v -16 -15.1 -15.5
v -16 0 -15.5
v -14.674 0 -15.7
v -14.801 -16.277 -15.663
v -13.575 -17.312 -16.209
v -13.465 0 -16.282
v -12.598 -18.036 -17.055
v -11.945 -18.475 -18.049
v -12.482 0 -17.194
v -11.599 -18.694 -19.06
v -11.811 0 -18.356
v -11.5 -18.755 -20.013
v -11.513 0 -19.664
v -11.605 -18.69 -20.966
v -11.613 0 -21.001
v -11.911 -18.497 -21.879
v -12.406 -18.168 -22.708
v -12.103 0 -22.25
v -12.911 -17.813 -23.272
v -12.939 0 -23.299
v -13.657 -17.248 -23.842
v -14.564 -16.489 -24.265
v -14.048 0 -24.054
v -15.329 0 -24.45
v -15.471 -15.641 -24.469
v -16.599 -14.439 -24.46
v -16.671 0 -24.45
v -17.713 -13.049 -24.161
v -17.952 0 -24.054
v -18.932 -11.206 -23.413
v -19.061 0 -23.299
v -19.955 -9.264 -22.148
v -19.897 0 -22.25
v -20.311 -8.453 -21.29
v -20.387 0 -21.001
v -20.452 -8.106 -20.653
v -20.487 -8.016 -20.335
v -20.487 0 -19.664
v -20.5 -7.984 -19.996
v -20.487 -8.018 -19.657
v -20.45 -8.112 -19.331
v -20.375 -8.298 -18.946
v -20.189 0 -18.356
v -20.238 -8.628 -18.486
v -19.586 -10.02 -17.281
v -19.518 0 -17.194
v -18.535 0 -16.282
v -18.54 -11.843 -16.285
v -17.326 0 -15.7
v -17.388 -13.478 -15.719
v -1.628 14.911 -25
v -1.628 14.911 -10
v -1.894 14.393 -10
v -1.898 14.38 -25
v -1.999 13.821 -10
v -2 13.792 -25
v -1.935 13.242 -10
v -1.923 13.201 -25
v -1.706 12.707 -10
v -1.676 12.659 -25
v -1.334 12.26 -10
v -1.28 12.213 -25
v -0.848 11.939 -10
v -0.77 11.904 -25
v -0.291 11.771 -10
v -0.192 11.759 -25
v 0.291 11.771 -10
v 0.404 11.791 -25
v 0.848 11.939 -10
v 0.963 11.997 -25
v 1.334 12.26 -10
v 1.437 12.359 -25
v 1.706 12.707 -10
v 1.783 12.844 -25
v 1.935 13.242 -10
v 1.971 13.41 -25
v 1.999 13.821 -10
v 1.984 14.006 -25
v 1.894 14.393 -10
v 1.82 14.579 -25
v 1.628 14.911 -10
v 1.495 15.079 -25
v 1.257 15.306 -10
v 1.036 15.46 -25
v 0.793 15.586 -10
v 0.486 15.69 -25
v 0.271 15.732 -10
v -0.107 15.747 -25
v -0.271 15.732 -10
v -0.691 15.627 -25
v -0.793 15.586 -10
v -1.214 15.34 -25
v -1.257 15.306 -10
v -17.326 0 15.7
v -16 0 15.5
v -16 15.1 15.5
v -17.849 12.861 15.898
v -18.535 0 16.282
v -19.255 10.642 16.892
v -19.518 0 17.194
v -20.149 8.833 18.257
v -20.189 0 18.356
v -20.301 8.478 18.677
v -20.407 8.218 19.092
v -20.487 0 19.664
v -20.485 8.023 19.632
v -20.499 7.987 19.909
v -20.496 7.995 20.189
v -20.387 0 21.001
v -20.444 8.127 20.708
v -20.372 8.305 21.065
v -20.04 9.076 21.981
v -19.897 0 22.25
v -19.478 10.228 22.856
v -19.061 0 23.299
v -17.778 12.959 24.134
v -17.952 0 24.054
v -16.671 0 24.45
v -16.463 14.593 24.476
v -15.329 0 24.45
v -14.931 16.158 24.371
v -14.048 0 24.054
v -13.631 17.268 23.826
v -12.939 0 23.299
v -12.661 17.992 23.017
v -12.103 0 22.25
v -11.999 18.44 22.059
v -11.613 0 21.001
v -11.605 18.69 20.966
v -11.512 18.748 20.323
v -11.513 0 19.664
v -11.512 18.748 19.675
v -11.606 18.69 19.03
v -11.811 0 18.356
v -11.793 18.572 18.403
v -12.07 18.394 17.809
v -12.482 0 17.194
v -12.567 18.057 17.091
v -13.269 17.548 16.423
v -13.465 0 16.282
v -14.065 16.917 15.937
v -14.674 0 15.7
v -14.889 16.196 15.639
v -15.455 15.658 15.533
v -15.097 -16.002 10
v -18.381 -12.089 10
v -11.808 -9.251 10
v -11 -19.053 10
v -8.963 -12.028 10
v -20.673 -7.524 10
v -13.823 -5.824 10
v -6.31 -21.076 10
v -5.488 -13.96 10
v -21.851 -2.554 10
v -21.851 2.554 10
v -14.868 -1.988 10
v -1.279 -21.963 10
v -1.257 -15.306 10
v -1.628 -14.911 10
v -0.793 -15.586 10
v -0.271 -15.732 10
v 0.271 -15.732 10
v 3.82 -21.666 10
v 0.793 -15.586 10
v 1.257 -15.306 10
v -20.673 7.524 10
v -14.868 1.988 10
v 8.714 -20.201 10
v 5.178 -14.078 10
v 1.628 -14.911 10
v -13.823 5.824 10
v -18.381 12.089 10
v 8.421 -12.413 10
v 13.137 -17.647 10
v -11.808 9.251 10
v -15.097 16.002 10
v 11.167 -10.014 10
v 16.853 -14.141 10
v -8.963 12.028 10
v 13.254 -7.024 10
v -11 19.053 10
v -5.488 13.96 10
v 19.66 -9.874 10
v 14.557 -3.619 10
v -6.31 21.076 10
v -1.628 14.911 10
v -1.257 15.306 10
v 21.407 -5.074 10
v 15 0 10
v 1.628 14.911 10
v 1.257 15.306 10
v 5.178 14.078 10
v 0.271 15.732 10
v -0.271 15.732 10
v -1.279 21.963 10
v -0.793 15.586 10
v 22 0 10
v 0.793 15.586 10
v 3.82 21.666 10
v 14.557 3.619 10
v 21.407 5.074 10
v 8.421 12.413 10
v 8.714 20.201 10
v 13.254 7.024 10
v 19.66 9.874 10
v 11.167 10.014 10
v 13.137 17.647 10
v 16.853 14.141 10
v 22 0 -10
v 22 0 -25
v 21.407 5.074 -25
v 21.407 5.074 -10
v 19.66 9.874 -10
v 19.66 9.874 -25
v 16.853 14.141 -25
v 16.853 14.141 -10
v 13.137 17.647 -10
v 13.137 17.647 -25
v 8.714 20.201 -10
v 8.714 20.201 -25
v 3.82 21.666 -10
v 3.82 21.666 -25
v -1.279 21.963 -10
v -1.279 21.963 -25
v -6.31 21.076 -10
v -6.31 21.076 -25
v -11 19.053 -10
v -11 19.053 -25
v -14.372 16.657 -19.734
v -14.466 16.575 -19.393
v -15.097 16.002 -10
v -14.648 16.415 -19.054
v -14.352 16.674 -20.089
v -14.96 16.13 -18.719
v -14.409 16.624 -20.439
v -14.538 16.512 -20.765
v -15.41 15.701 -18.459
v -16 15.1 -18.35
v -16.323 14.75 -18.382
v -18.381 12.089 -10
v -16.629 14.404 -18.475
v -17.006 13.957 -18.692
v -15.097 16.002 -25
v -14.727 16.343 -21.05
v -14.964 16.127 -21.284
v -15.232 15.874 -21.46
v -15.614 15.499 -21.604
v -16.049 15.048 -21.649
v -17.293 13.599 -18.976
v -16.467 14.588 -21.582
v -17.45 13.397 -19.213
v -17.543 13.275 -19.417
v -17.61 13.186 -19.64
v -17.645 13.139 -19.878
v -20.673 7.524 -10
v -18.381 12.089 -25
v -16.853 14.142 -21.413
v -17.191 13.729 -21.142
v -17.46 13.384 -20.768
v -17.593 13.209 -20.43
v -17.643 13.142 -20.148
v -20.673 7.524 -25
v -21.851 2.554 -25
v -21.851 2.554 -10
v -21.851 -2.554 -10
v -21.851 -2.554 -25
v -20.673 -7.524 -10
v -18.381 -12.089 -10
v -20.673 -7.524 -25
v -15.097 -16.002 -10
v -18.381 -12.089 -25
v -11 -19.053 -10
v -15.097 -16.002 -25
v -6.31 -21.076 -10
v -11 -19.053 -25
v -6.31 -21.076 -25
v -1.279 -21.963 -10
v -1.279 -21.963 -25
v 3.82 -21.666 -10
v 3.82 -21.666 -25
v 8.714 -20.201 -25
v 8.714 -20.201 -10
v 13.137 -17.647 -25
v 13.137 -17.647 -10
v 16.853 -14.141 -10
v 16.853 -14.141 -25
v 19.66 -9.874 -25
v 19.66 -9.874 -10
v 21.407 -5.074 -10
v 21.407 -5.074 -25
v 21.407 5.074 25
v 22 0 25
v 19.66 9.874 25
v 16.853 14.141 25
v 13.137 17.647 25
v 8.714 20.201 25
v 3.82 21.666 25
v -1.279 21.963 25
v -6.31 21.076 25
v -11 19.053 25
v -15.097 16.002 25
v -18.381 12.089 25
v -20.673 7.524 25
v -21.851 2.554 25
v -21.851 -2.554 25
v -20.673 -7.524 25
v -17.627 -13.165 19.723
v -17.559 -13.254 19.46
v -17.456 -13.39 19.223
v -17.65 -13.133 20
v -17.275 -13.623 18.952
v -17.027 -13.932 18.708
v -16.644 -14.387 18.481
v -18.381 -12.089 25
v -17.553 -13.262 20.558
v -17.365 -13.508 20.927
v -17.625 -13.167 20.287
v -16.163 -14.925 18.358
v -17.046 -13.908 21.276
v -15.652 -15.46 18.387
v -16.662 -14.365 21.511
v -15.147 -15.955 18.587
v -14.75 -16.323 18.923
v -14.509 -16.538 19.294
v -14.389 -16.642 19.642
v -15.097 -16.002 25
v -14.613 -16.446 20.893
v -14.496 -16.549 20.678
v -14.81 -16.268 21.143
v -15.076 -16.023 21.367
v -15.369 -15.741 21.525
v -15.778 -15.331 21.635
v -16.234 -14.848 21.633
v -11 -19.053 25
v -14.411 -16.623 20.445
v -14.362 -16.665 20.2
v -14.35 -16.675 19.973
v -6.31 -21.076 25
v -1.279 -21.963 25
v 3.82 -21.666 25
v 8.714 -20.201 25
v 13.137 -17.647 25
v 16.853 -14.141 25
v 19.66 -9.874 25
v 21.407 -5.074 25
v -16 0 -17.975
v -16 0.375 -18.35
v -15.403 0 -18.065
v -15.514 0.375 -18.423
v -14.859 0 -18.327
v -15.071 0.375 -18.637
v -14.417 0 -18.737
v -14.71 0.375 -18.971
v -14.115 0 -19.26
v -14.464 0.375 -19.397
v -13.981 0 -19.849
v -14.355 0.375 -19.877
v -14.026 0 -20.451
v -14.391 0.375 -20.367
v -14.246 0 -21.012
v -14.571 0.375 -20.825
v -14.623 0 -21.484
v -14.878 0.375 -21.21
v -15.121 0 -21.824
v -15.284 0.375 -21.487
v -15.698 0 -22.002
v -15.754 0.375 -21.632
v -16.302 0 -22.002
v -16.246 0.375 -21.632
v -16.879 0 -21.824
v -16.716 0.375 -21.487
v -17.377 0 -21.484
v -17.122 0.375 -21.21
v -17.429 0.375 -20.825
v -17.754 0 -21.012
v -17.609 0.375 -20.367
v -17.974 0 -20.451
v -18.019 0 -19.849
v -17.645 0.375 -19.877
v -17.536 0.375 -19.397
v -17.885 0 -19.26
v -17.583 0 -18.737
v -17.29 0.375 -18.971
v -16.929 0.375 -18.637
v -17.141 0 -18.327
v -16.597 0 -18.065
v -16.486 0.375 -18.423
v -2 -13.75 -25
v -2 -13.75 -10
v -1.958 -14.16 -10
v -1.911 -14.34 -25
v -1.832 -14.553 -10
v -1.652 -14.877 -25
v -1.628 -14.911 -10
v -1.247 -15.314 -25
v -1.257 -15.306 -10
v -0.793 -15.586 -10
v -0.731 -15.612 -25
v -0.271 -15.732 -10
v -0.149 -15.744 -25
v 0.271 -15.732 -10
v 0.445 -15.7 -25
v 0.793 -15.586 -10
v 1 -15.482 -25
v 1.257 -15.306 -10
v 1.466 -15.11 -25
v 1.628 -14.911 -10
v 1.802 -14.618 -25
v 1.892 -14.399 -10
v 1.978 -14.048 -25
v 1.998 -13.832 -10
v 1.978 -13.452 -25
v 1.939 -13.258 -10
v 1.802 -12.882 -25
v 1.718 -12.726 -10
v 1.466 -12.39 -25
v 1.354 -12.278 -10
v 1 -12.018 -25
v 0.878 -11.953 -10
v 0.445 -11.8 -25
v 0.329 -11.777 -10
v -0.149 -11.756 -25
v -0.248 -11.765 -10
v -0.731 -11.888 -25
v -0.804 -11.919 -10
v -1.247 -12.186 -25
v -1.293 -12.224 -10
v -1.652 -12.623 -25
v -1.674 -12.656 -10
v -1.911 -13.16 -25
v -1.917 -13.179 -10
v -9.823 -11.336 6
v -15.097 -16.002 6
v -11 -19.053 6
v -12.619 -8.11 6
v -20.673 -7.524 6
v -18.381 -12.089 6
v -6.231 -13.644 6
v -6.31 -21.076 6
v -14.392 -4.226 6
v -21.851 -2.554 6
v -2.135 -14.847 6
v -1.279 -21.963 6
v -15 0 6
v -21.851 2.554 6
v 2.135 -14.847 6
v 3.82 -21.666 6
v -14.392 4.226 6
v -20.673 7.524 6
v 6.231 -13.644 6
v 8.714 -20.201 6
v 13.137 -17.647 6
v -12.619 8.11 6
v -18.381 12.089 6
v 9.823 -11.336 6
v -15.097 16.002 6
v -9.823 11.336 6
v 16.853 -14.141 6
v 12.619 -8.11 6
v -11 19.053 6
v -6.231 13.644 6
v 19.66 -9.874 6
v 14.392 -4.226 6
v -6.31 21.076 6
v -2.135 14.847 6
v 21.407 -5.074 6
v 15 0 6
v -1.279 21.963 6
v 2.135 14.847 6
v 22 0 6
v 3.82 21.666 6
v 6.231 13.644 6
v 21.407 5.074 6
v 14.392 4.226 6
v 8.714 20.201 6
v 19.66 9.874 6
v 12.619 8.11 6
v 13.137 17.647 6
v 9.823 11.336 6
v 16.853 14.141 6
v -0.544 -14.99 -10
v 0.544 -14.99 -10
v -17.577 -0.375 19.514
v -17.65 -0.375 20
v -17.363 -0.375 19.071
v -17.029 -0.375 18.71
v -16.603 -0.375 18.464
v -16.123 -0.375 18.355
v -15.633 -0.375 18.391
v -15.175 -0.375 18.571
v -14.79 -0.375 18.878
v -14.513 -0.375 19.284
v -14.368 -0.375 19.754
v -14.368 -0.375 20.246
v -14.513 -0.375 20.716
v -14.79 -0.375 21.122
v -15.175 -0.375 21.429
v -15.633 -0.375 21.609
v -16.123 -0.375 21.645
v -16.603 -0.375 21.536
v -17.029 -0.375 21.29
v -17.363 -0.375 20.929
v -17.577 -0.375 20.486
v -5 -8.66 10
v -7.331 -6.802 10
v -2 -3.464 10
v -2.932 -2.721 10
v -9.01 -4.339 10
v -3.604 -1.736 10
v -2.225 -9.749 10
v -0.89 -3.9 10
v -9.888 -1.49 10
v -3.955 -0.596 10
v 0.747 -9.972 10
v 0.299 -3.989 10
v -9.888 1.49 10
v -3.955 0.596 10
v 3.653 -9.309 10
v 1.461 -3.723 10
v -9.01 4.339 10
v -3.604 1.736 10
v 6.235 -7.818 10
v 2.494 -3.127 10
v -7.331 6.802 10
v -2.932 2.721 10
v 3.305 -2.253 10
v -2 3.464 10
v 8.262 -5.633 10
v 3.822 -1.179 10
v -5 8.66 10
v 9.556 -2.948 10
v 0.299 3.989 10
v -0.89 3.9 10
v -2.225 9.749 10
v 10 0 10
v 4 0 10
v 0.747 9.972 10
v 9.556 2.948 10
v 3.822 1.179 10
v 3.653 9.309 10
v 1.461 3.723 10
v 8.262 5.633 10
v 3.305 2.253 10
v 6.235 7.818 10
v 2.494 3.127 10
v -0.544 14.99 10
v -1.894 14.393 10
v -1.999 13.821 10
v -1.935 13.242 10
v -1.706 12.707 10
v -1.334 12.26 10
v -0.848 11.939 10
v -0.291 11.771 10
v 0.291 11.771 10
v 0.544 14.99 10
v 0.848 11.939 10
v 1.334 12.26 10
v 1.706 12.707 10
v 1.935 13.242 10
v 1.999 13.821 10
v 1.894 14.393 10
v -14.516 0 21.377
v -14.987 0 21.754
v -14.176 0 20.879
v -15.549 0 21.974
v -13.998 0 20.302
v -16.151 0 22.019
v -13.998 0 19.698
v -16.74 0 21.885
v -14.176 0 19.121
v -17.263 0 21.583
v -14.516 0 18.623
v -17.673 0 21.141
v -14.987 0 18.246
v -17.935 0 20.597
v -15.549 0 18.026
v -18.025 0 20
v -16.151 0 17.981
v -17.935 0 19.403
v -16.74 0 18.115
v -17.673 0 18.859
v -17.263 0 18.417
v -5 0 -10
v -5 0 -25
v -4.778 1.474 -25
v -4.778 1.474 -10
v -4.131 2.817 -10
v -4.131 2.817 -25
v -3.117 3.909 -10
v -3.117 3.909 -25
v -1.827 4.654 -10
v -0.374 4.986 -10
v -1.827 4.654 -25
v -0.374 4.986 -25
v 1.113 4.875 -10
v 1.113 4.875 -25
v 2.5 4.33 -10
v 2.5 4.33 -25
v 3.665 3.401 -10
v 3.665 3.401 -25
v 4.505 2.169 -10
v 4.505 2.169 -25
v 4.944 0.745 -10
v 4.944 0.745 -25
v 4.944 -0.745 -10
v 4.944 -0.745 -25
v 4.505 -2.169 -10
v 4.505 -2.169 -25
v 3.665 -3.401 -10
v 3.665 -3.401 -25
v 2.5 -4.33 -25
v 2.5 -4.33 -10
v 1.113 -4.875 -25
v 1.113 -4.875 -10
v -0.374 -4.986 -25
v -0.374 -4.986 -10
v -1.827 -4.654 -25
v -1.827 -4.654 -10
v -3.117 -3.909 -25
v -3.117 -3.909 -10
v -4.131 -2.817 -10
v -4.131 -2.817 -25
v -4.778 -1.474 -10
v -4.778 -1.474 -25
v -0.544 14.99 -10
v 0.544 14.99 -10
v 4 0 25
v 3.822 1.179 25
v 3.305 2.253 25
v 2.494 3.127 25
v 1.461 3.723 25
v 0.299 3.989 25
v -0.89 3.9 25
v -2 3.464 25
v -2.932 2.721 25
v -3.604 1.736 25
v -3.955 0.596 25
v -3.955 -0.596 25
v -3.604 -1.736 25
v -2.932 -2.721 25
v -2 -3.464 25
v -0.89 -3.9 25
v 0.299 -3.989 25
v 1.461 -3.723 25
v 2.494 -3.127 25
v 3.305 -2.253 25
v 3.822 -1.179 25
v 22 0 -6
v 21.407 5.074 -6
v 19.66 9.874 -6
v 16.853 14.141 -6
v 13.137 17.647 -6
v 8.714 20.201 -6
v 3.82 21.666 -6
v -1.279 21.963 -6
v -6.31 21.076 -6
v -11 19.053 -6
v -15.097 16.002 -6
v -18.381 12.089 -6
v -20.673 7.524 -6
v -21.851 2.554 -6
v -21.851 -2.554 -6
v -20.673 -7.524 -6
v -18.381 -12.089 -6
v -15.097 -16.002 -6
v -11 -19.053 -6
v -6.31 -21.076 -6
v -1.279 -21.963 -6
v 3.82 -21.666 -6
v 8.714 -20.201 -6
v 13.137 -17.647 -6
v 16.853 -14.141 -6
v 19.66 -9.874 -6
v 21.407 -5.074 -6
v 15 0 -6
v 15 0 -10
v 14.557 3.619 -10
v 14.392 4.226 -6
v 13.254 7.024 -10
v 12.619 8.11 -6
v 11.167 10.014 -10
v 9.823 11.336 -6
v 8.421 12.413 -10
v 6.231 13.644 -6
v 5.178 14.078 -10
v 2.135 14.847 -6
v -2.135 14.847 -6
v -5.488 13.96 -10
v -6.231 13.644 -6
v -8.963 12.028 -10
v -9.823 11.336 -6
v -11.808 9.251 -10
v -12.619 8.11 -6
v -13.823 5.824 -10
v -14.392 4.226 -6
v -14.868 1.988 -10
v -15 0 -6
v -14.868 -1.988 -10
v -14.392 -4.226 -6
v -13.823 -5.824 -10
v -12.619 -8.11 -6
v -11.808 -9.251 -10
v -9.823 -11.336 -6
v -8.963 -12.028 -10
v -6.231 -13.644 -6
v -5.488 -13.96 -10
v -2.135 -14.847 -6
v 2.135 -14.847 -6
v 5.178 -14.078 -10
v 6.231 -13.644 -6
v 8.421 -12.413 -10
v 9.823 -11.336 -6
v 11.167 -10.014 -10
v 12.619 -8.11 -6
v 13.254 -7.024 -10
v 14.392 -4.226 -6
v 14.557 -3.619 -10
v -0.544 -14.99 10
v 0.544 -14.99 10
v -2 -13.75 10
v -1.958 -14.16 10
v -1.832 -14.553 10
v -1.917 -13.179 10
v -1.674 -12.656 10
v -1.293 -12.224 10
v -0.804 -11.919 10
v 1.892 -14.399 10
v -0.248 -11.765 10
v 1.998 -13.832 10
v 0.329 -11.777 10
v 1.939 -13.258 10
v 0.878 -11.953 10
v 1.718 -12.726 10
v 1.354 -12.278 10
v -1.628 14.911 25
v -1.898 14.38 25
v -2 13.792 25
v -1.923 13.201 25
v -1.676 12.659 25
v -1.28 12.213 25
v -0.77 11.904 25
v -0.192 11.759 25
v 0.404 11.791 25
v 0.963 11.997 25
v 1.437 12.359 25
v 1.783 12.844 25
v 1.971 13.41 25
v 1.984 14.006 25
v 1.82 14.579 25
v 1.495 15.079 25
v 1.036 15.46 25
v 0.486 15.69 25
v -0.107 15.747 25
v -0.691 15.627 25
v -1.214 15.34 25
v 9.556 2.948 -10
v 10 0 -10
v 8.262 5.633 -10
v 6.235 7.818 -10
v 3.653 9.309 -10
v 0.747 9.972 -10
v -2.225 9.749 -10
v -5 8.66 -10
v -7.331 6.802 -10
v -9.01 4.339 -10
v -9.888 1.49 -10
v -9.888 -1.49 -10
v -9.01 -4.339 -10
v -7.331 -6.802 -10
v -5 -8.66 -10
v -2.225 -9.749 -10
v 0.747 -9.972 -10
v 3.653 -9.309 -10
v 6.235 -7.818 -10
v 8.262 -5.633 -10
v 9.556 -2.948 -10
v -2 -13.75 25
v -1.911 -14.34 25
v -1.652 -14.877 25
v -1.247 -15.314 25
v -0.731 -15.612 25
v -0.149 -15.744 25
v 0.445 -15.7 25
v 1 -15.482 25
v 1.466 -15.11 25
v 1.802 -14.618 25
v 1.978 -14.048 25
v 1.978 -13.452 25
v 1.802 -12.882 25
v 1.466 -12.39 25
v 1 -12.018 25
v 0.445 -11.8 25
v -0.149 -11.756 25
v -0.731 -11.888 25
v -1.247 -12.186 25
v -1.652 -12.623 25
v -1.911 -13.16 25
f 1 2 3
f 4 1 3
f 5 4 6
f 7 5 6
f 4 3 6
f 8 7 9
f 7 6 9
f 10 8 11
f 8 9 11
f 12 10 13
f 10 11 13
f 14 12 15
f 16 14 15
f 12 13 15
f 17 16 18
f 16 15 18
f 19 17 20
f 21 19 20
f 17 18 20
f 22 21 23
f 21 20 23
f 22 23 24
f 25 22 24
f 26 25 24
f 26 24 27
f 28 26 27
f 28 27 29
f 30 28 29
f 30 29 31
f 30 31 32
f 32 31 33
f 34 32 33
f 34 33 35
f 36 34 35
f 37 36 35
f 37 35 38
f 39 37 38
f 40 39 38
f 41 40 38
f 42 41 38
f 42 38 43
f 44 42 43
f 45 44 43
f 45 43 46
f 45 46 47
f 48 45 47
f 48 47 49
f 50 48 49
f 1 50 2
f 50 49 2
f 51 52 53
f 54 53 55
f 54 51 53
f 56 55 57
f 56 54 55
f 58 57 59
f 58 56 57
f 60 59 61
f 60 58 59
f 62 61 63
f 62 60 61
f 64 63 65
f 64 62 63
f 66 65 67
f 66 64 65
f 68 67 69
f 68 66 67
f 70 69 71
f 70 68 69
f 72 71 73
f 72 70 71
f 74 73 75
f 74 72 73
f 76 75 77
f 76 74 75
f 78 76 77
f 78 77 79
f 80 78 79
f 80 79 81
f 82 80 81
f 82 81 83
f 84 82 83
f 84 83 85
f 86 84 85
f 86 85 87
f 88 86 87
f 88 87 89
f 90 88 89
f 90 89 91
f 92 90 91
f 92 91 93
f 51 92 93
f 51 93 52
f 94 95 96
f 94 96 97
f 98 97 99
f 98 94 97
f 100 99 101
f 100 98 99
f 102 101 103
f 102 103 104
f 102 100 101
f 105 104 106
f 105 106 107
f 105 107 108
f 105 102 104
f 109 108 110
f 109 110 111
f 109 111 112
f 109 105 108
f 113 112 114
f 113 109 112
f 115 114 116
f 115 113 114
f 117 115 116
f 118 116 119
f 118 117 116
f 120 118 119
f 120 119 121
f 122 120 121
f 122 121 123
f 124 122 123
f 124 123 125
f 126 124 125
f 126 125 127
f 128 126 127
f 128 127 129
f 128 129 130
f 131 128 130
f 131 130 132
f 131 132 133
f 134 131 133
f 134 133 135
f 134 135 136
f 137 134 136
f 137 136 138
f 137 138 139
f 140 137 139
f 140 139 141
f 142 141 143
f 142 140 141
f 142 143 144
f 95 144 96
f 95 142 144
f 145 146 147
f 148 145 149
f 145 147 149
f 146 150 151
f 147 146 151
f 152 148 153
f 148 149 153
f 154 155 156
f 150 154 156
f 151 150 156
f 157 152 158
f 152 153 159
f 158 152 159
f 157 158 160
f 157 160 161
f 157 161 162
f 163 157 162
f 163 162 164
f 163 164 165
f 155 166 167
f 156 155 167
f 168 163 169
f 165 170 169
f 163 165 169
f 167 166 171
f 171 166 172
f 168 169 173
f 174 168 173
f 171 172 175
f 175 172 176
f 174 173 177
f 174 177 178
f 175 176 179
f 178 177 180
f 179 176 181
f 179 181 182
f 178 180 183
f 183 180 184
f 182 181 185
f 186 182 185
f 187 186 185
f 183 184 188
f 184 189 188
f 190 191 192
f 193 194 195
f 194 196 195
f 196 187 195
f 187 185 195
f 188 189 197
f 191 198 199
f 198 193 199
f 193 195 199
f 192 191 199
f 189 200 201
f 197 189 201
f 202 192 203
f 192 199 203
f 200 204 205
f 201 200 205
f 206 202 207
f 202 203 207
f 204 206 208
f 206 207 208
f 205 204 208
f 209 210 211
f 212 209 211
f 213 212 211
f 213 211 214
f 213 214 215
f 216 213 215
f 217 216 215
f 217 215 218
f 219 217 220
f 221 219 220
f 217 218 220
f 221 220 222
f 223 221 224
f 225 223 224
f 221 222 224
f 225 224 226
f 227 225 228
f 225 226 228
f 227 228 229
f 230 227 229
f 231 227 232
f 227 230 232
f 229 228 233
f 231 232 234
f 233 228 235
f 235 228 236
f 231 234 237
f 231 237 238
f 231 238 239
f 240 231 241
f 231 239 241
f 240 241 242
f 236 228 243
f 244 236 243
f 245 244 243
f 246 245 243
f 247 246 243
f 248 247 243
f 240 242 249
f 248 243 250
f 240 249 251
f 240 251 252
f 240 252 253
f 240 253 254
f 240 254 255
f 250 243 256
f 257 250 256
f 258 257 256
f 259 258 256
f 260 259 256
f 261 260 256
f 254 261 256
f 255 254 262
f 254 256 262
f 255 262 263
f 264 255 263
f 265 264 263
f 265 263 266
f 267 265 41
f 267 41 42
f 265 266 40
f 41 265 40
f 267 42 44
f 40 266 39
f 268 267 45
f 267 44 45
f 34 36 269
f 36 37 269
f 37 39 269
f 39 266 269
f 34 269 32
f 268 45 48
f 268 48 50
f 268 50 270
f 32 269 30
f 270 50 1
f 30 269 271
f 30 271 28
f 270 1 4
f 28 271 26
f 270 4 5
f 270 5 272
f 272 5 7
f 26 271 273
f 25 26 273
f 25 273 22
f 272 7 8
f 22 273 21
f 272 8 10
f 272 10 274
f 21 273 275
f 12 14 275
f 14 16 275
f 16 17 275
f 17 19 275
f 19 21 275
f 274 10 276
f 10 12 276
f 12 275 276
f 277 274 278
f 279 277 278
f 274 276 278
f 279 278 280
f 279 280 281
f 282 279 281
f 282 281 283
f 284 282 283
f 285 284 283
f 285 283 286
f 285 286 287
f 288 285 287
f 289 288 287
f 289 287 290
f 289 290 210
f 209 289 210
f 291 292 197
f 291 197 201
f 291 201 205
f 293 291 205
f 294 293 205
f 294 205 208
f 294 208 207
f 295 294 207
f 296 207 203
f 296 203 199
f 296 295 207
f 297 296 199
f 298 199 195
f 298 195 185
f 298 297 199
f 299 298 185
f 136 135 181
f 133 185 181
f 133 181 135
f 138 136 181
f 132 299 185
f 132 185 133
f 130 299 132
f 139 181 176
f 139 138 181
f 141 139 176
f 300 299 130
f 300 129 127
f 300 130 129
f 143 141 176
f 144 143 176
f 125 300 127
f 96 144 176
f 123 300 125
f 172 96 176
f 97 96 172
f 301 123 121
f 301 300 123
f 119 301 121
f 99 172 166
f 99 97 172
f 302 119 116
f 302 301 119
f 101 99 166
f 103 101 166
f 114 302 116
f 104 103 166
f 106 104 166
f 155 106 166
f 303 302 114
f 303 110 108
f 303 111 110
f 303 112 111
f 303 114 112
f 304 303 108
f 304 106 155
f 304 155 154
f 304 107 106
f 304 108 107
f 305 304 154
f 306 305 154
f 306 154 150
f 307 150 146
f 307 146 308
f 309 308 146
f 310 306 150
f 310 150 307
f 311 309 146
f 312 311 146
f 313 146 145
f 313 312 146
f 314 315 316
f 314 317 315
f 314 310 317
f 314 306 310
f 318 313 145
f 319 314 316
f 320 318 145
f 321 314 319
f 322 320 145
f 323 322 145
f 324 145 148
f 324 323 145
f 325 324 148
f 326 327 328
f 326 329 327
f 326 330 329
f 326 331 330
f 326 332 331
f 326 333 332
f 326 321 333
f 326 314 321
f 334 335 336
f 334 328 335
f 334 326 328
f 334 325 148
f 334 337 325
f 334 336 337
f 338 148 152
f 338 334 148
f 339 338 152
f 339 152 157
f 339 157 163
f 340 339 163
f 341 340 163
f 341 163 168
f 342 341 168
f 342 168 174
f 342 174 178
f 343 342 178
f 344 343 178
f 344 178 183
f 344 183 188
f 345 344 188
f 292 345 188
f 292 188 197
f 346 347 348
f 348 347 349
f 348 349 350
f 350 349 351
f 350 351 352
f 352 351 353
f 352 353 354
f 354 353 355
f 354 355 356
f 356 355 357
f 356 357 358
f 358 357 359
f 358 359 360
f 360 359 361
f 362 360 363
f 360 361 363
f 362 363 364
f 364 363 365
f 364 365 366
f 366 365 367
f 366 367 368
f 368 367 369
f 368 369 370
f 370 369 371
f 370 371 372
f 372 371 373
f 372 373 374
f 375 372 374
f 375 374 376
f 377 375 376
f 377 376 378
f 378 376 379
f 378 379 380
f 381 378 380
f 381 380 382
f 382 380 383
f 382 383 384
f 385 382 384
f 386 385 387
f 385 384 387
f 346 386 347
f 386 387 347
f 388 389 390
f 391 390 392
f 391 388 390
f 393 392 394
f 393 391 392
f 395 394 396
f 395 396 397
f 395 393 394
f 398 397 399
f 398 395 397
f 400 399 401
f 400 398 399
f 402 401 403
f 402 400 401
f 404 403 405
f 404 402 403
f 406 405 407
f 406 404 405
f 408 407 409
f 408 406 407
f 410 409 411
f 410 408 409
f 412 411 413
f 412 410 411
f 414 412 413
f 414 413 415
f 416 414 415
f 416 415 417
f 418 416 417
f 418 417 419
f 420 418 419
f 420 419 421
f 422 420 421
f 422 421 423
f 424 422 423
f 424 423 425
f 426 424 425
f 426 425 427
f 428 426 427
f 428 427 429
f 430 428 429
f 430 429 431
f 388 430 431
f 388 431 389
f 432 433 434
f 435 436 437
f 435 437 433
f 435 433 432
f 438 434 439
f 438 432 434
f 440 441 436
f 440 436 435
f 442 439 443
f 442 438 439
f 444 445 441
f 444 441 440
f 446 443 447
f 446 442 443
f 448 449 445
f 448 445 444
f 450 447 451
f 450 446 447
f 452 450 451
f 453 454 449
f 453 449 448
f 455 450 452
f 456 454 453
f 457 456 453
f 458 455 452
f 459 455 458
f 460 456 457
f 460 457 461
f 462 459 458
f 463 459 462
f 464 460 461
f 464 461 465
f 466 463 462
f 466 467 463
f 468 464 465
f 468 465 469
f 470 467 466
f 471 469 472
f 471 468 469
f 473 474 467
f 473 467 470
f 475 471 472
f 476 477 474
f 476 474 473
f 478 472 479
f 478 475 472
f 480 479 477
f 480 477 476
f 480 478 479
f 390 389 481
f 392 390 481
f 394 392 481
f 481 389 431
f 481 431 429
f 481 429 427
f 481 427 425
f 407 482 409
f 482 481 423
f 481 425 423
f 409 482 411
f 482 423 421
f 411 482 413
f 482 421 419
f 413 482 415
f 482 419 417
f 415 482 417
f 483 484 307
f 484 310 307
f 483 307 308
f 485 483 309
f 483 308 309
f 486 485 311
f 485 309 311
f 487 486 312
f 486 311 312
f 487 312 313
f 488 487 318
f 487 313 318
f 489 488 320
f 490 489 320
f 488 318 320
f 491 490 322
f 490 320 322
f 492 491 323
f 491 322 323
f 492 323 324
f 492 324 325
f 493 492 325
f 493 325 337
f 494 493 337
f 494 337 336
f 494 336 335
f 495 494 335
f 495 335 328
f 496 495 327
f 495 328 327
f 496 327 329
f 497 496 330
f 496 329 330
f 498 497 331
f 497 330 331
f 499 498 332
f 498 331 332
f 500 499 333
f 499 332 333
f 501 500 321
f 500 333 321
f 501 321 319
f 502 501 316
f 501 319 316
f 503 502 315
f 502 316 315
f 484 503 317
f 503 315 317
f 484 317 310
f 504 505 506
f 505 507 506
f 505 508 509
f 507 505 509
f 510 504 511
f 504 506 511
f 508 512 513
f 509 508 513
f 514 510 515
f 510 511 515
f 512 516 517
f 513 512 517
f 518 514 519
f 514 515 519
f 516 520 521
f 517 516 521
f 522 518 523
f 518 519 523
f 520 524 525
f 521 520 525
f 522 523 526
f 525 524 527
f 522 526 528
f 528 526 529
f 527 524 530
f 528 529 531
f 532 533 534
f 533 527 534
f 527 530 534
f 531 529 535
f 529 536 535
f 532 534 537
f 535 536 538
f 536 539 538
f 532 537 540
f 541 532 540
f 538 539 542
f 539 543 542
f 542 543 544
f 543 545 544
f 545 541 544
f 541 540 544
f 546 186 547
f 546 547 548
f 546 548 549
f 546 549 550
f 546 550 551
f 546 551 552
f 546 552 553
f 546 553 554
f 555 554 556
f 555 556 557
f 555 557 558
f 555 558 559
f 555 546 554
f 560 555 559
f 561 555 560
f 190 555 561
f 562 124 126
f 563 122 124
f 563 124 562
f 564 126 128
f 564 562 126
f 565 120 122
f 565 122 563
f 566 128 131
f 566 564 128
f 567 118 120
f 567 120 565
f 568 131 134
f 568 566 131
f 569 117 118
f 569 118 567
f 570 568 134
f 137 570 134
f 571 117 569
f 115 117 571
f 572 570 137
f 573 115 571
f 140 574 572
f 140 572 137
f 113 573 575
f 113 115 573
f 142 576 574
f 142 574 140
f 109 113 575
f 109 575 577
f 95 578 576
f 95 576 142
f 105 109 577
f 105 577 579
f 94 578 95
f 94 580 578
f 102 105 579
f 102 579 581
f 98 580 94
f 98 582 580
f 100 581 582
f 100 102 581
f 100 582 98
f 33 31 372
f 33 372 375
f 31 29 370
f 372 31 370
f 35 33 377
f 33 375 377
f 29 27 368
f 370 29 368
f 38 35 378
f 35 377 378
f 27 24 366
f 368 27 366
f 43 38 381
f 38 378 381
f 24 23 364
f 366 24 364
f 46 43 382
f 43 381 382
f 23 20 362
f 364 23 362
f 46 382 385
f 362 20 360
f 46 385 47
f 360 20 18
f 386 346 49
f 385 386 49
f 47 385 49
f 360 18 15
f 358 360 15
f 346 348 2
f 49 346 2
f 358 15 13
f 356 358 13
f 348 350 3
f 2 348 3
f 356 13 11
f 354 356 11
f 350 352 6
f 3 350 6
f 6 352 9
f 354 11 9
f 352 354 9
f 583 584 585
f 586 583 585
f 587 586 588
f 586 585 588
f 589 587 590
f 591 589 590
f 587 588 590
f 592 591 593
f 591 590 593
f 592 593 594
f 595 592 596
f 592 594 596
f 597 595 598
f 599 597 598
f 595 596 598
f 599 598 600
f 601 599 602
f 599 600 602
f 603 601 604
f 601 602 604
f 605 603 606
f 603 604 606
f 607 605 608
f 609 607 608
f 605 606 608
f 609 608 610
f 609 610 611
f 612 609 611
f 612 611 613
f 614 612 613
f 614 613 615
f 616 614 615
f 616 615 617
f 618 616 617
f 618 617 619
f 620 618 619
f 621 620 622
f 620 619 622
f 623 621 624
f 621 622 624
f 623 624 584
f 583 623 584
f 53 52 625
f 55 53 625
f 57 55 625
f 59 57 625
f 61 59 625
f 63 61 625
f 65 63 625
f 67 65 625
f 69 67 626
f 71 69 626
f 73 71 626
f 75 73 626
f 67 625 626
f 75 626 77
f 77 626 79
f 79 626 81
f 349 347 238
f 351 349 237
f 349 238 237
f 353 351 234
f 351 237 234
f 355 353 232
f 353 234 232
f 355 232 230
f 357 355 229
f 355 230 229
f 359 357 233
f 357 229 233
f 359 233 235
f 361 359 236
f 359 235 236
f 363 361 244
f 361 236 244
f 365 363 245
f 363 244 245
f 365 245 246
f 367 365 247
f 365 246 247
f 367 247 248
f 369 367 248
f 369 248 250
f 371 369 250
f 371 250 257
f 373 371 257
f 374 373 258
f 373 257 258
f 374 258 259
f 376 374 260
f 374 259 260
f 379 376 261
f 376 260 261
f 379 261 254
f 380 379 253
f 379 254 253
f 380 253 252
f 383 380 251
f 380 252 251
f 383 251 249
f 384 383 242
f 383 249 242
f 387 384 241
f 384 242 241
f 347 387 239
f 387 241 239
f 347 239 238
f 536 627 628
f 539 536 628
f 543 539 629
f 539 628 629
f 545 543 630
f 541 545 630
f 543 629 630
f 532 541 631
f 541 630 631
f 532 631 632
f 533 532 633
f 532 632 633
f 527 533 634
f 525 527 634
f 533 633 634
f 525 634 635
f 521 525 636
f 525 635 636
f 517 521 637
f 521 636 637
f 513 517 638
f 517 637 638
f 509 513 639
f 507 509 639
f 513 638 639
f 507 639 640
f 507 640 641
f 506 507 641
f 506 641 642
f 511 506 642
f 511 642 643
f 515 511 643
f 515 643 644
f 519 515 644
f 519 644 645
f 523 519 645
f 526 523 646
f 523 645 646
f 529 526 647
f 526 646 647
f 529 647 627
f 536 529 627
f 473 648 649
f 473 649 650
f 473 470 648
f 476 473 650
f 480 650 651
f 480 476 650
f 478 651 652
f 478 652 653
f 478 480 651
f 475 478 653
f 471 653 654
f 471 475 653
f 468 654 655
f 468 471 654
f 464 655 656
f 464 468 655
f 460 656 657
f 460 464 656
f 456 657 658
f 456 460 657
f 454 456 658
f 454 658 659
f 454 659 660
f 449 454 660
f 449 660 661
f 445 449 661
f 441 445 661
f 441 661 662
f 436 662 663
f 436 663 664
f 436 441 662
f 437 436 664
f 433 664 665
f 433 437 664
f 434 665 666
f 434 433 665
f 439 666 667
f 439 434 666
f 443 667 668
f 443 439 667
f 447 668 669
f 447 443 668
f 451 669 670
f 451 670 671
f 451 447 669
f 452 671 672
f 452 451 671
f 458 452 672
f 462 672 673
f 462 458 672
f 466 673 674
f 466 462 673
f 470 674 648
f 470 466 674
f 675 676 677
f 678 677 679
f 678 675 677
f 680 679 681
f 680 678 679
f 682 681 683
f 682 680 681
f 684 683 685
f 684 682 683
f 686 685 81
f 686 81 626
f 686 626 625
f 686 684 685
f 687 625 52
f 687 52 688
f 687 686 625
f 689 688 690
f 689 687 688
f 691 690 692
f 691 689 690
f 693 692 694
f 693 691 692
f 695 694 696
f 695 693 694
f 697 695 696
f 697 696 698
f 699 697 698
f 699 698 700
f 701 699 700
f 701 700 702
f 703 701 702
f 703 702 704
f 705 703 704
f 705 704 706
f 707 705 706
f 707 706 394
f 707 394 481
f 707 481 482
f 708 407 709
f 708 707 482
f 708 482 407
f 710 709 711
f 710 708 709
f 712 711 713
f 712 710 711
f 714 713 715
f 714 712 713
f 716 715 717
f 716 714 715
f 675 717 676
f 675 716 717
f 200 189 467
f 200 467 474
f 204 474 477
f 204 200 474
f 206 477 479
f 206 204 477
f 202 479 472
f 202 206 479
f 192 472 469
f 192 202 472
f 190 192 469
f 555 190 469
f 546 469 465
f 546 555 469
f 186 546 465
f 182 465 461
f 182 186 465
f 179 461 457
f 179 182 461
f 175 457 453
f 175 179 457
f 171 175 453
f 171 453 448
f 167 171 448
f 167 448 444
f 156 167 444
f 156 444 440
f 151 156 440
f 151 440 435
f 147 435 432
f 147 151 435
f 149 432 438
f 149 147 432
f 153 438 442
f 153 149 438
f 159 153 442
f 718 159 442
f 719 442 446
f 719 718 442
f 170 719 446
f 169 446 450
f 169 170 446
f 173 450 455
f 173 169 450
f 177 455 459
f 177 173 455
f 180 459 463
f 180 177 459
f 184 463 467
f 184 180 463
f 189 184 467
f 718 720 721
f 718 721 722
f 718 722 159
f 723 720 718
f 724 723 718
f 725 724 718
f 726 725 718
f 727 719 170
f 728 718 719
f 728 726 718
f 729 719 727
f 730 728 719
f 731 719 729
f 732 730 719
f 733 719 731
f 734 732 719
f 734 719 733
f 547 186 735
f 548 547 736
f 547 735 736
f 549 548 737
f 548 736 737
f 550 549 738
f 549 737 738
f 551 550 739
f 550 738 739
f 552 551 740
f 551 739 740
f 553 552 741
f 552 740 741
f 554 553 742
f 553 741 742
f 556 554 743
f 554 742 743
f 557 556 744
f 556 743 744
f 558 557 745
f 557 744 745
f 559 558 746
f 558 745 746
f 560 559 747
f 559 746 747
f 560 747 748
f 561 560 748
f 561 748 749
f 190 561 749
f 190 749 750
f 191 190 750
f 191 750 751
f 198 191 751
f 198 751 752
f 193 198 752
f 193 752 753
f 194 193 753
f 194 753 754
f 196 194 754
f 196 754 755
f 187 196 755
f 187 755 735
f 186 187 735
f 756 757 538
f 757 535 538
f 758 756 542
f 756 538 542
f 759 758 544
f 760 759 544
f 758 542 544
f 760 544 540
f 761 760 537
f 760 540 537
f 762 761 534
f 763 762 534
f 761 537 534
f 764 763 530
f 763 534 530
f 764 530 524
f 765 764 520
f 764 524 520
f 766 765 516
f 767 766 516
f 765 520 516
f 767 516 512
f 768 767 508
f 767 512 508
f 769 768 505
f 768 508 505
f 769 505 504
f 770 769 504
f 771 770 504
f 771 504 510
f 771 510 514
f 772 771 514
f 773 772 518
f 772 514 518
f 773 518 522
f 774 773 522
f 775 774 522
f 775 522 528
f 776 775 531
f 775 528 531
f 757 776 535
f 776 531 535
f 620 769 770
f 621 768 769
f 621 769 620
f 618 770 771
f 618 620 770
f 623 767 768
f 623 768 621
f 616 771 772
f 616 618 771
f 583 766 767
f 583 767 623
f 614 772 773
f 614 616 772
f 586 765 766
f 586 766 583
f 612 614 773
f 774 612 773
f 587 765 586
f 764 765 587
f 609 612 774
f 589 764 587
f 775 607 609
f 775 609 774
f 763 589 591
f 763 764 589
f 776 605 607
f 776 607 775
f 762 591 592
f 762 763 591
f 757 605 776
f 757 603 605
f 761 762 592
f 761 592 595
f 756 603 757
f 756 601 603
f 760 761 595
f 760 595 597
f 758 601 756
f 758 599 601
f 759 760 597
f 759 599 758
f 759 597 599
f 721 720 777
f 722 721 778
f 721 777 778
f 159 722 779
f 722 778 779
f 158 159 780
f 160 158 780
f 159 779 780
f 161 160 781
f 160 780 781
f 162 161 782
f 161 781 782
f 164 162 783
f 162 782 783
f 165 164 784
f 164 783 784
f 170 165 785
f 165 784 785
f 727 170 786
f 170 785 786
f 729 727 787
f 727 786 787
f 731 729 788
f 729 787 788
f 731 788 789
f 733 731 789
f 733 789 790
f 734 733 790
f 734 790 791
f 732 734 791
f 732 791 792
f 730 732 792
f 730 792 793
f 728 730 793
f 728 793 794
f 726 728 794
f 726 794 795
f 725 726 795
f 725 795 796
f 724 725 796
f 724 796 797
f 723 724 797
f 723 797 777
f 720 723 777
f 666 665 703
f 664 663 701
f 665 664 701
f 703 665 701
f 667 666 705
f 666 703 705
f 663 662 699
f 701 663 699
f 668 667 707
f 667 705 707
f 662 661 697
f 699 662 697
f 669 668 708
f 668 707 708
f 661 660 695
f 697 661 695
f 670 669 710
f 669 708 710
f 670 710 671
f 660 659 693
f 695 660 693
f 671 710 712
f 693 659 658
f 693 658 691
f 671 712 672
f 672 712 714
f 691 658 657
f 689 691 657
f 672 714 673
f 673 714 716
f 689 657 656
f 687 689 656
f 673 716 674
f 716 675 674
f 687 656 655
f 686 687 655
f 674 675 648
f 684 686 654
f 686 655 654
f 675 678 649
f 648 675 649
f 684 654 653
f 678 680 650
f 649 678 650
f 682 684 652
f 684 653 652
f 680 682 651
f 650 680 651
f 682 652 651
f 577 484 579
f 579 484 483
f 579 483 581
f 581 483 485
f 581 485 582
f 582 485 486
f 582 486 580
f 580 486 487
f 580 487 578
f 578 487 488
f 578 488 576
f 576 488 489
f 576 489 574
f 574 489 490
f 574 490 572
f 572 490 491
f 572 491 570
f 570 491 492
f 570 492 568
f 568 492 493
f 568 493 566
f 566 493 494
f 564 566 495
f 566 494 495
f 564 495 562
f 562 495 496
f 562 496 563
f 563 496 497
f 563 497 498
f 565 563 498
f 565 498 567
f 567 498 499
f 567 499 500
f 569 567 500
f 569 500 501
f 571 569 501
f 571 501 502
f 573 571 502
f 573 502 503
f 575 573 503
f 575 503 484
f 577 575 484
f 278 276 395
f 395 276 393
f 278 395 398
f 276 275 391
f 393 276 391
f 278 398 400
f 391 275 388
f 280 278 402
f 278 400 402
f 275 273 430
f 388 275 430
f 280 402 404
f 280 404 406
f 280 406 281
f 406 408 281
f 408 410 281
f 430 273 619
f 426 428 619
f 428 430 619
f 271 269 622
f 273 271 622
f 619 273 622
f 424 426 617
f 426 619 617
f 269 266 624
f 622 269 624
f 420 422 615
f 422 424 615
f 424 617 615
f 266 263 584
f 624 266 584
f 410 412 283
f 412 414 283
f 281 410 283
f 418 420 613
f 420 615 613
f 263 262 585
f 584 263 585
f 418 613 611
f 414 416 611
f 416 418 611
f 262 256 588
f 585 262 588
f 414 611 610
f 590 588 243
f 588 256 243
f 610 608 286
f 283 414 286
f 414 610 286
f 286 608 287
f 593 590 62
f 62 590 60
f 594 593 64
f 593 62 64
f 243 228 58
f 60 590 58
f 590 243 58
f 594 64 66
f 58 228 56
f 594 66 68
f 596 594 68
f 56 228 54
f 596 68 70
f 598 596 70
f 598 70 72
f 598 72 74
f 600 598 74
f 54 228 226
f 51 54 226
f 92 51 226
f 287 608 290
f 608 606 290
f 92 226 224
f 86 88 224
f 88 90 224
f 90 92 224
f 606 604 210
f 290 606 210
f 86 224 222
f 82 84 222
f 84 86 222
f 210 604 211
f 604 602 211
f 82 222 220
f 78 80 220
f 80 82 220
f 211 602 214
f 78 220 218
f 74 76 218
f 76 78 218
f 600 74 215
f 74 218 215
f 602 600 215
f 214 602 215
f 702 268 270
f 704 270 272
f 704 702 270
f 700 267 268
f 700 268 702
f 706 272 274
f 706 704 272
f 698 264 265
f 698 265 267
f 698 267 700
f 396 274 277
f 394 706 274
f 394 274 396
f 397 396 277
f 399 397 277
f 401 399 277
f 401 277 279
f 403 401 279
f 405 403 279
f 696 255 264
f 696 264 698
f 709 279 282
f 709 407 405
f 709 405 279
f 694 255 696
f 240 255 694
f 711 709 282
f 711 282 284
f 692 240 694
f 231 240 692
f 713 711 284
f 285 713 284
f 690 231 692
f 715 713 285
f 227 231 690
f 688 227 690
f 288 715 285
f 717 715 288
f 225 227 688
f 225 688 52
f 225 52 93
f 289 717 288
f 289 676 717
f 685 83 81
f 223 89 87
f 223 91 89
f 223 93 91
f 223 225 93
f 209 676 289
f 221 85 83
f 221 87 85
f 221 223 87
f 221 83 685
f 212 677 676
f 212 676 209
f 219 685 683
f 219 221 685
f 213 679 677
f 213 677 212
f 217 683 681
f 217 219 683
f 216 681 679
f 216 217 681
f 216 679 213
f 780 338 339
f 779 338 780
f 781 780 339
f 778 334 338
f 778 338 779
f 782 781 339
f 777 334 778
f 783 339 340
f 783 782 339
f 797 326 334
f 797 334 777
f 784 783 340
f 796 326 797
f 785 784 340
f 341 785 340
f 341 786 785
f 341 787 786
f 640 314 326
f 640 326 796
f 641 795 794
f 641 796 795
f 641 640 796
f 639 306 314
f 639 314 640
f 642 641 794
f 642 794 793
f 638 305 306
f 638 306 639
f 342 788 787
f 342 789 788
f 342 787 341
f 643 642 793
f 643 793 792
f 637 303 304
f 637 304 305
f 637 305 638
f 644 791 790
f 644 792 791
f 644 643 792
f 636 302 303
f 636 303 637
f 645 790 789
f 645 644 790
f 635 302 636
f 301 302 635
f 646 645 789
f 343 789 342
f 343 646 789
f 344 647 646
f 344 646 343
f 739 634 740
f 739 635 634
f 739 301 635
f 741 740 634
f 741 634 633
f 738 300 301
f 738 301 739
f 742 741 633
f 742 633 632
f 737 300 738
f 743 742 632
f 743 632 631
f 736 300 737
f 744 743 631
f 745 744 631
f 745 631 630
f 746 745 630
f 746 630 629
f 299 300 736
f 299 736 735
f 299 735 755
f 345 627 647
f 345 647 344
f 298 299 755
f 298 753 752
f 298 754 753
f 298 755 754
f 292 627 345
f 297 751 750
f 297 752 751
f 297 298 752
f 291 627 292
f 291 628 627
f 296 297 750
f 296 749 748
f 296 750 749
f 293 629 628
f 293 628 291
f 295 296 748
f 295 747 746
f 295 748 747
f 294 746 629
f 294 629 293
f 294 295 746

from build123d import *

# Parameters (mm, degrees)
SKETCH_1_R                   = 22
EXTRUDE_1_DEPTH              = 6
SKETCH_2_R                   = 15
EXTRUDE_2_DEPTH              = 10
EXTRUDE_START                = 15
SKETCH_3_R                   = 22
SKETCH_3_R_2                 = 2
EXTRUDE_3_DEPTH              = 15
SKETCH_4_R                   = 1.5
CUT_EXTRUDE_1_DEPTH          = 40.912404087
SKETCH_5_R                   = 4.5
CUT_EXTRUDE_2_DEPTH          = 40.91240426
HOLE_WIZARD_M4_1_D           = 3.3
HOLE_WIZARD_M4_1_CSINK_D     = 4.05
HOLE_WIZARD_M4_1_CSINK_ANGLE = 90
SKETCH_8_R                   = 1.5
CUT_EXTRUDE_3_DEPTH          = 40.91240426
SKETCH_9_R                   = 4.5
CUT_EXTRUDE_4_DEPTH          = 40.91240426
HOLE_WIZARD_M4_2_D           = 3.3
HOLE_WIZARD_M4_2_CSINK_D     = 4.05
HOLE_WIZARD_M4_2_CSINK_ANGLE = 90
SKETCH_11_R                  = 4
CUT_EXTRUDE_5_DEPTH          = 15
SKETCH_12_R                  = 5
CUT_EXTRUDE_6_DEPTH          = 15
SKETCH_13_R                  = 10
CUT_EXTRUDE_7_DEPTH          = 10


with BuildPart() as part:
    # 草图1 → 凸台-拉伸1 (new, symmetric)
    with BuildSketch(Plane.XY):
        Circle(SKETCH_1_R)
    extrude(amount=EXTRUDE_1_DEPTH, both=True)

    # 草图2 → 凸台-拉伸2 (add, symmetric)
    with BuildSketch(Plane.XY):
        Circle(SKETCH_2_R)
    extrude(amount=EXTRUDE_2_DEPTH, both=True)

    # 草图3 → 凸台-拉伸3 (add)
    with BuildSketch(Plane.XY.offset(10).offset(EXTRUDE_START)):
        Circle(SKETCH_3_R)
        with Locations(Location((0, 13.75, 0), (0, 0, 144.501487602))):
            Circle(SKETCH_3_R_2, mode=Mode.SUBTRACT)
        with Locations(Location((0, -13.75, 0), (0, 0, 180))):
            Circle(SKETCH_3_R_2, mode=Mode.SUBTRACT)
    extrude_3 = extrude(amount=-EXTRUDE_3_DEPTH)

    # 草图4 → 切除-拉伸1 (cut, through all)
    with BuildSketch(Plane(origin=(0, 0, 0), x_dir=(1, 0, 0), z_dir=(0, 1, 0))):
        with Locations(Location((-16, -20, 0), (0, 0, 270))):
            Circle(SKETCH_4_R)
    extrude(amount=-CUT_EXTRUDE_1_DEPTH, mode=Mode.SUBTRACT)

    # 草图5 → 切除-拉伸2 (cut, through all)
    with BuildSketch(Plane(origin=(0, 0, 0), x_dir=(1, 0, 0), z_dir=(0, 1, 0))):
        with Locations(Location((-16, -20, 0), (0, 0, 90))):
            Circle(SKETCH_5_R)
    extrude(amount=CUT_EXTRUDE_2_DEPTH, mode=Mode.SUBTRACT)

    # M4 螺纹孔1 (through all)
    with Locations(Plane(origin=(0, 0, 0), x_dir=(1, 0, 0), z_dir=(0, 1, 0))):
        with Locations((-16, -20)):
            CounterSinkHole(HOLE_WIZARD_M4_1_D / 2, HOLE_WIZARD_M4_1_CSINK_D / 2, counter_sink_angle=HOLE_WIZARD_M4_1_CSINK_ANGLE)

    # 镜向1: 凸台-拉伸3 across plane
    add(extrude_3.mirror(Plane.XY))

    # 草图8 → 切除-拉伸3 (cut, through all)
    with BuildSketch(Plane(origin=(0, 0, 0), x_dir=(1, 0, 0), z_dir=(0, 1, 0))):
        with Locations(Location((-16, 20, 0), (0, 0, 90))):
            Circle(SKETCH_8_R)
    extrude(amount=CUT_EXTRUDE_3_DEPTH, mode=Mode.SUBTRACT)

    # 草图9 → 切除-拉伸4 (cut, through all)
    with BuildSketch(Plane(origin=(0, 0, 0), x_dir=(1, 0, 0), z_dir=(0, 1, 0))):
        with Locations(Location((-16, 20, 0), (0, 0, 270))):
            Circle(SKETCH_9_R)
    extrude(amount=-CUT_EXTRUDE_4_DEPTH, mode=Mode.SUBTRACT)

    # M4 螺纹孔2 (through all)
    with Locations(Plane(origin=(-16, 0, -20), x_dir=(0, 0, -1), z_dir=(0, -1, 0))):
        with Locations((0, 0)):
            CounterSinkHole(HOLE_WIZARD_M4_2_D / 2, HOLE_WIZARD_M4_2_CSINK_D / 2, counter_sink_angle=HOLE_WIZARD_M4_2_CSINK_ANGLE)

    # 草图11 → 切除-拉伸5 (cut)
    with BuildSketch(Plane.XY.offset(25)):
        Circle(SKETCH_11_R)
    extrude(amount=-CUT_EXTRUDE_5_DEPTH, mode=Mode.SUBTRACT)

    # 草图12 → 切除-拉伸6 (cut)
    with BuildSketch(Plane(origin=(0, 0, -25), x_dir=(-1, 0, 0), z_dir=(0, 0, -1))):
        Circle(SKETCH_12_R)
    extrude(amount=-CUT_EXTRUDE_6_DEPTH, mode=Mode.SUBTRACT)

    # 草图13 → 切除-拉伸7 (cut, symmetric)
    with BuildSketch(Plane.XY):
        Circle(SKETCH_13_R)
    extrude(amount=CUT_EXTRUDE_7_DEPTH, both=True, mode=Mode.SUBTRACT)


solid = part.part
